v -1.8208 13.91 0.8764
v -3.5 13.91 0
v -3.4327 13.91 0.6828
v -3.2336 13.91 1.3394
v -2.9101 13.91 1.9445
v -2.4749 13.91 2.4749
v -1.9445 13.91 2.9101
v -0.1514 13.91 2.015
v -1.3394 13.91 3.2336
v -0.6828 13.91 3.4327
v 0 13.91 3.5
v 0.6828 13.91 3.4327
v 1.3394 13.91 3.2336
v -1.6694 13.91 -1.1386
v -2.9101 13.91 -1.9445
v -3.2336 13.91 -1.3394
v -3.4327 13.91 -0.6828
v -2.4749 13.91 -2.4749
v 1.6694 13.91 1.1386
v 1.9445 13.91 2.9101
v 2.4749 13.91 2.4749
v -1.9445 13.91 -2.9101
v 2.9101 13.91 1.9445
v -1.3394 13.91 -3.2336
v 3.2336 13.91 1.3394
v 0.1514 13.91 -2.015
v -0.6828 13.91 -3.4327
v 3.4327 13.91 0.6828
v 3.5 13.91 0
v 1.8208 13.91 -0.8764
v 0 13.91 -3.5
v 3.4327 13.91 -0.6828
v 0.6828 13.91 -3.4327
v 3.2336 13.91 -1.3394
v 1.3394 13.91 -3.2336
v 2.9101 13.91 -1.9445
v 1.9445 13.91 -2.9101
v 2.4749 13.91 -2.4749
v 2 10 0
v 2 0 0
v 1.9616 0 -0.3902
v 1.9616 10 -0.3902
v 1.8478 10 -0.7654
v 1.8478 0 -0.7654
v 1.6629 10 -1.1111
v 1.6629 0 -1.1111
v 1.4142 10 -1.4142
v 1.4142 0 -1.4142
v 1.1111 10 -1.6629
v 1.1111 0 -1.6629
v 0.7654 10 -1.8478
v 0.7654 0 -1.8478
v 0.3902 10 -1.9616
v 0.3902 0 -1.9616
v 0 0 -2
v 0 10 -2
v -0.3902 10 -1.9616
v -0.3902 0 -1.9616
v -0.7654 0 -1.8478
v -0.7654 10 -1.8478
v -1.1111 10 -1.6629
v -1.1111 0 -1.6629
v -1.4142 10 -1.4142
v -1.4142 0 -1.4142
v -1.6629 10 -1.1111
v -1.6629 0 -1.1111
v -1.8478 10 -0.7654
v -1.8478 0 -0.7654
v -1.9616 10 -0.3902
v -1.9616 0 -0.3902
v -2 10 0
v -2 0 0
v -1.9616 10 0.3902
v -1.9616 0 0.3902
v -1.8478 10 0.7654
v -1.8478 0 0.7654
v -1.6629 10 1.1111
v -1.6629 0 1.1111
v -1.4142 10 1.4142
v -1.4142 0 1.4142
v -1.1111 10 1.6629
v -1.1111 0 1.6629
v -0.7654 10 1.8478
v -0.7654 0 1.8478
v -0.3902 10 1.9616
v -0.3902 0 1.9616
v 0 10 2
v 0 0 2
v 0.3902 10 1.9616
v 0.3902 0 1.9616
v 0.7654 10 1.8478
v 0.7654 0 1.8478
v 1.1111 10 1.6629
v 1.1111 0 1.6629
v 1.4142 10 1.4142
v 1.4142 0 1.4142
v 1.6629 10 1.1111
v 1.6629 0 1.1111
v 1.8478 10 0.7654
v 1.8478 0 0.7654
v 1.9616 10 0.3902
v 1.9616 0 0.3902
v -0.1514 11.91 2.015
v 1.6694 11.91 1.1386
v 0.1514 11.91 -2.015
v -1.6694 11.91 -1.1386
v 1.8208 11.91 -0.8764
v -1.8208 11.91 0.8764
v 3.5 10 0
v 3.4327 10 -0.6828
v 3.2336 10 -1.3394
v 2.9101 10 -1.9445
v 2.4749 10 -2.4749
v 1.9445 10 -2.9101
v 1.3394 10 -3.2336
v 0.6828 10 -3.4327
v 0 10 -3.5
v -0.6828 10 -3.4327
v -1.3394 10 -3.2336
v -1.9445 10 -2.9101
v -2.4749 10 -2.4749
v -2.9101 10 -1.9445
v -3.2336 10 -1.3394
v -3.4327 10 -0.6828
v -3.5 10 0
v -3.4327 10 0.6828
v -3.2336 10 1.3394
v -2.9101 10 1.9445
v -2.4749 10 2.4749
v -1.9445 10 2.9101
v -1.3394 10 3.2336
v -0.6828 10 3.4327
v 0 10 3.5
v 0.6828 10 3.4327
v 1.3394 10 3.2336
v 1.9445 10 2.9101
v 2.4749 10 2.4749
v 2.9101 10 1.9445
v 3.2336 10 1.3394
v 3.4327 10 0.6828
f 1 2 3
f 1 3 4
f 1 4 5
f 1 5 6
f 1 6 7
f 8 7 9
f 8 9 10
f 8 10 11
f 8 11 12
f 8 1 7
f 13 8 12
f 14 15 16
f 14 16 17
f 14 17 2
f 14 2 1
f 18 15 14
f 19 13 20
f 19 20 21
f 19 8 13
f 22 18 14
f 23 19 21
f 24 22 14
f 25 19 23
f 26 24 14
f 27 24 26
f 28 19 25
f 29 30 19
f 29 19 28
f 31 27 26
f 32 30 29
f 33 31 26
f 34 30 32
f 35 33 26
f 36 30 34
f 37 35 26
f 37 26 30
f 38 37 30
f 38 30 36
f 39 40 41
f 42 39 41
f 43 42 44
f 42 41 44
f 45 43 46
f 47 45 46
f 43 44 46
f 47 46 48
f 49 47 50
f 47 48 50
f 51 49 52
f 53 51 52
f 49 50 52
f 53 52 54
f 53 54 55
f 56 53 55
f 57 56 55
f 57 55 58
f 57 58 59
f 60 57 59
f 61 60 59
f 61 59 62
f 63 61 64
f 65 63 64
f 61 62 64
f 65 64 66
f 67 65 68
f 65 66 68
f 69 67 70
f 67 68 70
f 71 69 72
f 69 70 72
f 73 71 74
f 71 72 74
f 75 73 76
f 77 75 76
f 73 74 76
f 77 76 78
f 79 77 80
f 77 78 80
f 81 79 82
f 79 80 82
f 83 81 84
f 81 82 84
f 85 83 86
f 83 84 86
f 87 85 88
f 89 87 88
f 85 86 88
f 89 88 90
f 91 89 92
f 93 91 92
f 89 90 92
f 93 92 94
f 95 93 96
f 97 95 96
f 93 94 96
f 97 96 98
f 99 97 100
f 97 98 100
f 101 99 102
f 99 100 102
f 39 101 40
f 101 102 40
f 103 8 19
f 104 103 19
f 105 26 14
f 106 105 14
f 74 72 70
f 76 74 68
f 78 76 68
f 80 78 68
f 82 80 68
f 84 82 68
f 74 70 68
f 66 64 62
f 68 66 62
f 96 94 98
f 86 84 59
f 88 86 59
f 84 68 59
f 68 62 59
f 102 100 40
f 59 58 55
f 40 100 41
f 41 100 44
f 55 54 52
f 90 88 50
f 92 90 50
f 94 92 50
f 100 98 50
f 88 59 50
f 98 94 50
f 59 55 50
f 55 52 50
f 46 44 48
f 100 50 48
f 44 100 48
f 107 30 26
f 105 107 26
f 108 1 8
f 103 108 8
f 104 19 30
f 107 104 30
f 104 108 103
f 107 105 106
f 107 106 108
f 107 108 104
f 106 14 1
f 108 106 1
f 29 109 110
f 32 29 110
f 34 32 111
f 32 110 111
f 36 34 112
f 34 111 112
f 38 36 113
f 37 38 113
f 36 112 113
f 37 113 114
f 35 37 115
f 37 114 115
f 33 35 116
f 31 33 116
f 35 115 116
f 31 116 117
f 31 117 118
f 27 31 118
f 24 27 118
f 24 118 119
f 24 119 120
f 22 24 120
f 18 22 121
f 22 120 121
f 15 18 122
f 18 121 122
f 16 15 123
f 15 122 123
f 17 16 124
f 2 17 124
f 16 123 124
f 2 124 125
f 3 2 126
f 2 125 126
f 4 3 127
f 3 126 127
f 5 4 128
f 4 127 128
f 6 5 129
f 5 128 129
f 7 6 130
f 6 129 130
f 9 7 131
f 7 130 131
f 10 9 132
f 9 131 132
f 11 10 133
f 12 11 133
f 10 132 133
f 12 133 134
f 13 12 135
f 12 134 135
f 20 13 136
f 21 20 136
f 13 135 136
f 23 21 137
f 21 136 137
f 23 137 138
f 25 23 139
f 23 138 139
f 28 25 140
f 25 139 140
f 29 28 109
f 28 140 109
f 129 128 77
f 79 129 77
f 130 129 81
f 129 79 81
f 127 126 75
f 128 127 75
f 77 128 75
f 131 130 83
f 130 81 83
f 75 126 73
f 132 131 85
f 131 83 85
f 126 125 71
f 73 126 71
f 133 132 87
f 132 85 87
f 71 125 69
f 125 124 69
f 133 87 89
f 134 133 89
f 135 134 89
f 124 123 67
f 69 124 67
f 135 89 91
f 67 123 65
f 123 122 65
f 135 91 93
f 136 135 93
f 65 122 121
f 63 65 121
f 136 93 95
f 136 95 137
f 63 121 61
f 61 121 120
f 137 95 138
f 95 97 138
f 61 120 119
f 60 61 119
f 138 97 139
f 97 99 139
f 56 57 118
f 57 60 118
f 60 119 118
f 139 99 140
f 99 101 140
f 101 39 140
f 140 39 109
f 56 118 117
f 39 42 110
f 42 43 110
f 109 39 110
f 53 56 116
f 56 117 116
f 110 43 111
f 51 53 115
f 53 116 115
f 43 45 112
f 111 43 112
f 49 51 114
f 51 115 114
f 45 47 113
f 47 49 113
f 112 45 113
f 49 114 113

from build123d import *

# Parameters (mm, degrees)
SKETCH_1_R          = 2
EXTRUDE_1_DEPTH     = 10
SKETCH_2_R          = 3.5
EXTRUDE_2_DEPTH     = 3.91
CUT_EXTRUDE_1_DEPTH = 2


with BuildPart() as part:
    # 草图1 → 凸台-拉伸1 (new body)
    with BuildSketch(Plane(origin=(0, 0, 0), x_dir=(1, 0, 0), z_dir=(0, 1, 0))):
        Circle(SKETCH_1_R)
    extrude(amount=EXTRUDE_1_DEPTH)

    # 草图2 → 凸台-拉伸2 (add)
    with BuildSketch(Plane(origin=(0, 10, 0), x_dir=(1, 0, 0), z_dir=(0, 1, 0))):
        Circle(SKETCH_2_R)
    extrude(amount=EXTRUDE_2_DEPTH)

    # 草图3 → 切除-拉伸1 (cut)
    with BuildSketch(Plane(origin=(0, 13.91, 0), x_dir=(1, 0, 0), z_dir=(0, 1, 0))):
        Polygon((1.669374847, -1.13864874), (1.820786158, 0.876396656), (0.151411311, 2.015045396), (-1.669374847, 1.13864874), (-1.820786158, -0.876396656), (-0.151411311, -2.015045396), align=None)
    extrude(amount=-CUT_EXTRUDE_1_DEPTH, mode=Mode.SUBTRACT)


solid = part.part
